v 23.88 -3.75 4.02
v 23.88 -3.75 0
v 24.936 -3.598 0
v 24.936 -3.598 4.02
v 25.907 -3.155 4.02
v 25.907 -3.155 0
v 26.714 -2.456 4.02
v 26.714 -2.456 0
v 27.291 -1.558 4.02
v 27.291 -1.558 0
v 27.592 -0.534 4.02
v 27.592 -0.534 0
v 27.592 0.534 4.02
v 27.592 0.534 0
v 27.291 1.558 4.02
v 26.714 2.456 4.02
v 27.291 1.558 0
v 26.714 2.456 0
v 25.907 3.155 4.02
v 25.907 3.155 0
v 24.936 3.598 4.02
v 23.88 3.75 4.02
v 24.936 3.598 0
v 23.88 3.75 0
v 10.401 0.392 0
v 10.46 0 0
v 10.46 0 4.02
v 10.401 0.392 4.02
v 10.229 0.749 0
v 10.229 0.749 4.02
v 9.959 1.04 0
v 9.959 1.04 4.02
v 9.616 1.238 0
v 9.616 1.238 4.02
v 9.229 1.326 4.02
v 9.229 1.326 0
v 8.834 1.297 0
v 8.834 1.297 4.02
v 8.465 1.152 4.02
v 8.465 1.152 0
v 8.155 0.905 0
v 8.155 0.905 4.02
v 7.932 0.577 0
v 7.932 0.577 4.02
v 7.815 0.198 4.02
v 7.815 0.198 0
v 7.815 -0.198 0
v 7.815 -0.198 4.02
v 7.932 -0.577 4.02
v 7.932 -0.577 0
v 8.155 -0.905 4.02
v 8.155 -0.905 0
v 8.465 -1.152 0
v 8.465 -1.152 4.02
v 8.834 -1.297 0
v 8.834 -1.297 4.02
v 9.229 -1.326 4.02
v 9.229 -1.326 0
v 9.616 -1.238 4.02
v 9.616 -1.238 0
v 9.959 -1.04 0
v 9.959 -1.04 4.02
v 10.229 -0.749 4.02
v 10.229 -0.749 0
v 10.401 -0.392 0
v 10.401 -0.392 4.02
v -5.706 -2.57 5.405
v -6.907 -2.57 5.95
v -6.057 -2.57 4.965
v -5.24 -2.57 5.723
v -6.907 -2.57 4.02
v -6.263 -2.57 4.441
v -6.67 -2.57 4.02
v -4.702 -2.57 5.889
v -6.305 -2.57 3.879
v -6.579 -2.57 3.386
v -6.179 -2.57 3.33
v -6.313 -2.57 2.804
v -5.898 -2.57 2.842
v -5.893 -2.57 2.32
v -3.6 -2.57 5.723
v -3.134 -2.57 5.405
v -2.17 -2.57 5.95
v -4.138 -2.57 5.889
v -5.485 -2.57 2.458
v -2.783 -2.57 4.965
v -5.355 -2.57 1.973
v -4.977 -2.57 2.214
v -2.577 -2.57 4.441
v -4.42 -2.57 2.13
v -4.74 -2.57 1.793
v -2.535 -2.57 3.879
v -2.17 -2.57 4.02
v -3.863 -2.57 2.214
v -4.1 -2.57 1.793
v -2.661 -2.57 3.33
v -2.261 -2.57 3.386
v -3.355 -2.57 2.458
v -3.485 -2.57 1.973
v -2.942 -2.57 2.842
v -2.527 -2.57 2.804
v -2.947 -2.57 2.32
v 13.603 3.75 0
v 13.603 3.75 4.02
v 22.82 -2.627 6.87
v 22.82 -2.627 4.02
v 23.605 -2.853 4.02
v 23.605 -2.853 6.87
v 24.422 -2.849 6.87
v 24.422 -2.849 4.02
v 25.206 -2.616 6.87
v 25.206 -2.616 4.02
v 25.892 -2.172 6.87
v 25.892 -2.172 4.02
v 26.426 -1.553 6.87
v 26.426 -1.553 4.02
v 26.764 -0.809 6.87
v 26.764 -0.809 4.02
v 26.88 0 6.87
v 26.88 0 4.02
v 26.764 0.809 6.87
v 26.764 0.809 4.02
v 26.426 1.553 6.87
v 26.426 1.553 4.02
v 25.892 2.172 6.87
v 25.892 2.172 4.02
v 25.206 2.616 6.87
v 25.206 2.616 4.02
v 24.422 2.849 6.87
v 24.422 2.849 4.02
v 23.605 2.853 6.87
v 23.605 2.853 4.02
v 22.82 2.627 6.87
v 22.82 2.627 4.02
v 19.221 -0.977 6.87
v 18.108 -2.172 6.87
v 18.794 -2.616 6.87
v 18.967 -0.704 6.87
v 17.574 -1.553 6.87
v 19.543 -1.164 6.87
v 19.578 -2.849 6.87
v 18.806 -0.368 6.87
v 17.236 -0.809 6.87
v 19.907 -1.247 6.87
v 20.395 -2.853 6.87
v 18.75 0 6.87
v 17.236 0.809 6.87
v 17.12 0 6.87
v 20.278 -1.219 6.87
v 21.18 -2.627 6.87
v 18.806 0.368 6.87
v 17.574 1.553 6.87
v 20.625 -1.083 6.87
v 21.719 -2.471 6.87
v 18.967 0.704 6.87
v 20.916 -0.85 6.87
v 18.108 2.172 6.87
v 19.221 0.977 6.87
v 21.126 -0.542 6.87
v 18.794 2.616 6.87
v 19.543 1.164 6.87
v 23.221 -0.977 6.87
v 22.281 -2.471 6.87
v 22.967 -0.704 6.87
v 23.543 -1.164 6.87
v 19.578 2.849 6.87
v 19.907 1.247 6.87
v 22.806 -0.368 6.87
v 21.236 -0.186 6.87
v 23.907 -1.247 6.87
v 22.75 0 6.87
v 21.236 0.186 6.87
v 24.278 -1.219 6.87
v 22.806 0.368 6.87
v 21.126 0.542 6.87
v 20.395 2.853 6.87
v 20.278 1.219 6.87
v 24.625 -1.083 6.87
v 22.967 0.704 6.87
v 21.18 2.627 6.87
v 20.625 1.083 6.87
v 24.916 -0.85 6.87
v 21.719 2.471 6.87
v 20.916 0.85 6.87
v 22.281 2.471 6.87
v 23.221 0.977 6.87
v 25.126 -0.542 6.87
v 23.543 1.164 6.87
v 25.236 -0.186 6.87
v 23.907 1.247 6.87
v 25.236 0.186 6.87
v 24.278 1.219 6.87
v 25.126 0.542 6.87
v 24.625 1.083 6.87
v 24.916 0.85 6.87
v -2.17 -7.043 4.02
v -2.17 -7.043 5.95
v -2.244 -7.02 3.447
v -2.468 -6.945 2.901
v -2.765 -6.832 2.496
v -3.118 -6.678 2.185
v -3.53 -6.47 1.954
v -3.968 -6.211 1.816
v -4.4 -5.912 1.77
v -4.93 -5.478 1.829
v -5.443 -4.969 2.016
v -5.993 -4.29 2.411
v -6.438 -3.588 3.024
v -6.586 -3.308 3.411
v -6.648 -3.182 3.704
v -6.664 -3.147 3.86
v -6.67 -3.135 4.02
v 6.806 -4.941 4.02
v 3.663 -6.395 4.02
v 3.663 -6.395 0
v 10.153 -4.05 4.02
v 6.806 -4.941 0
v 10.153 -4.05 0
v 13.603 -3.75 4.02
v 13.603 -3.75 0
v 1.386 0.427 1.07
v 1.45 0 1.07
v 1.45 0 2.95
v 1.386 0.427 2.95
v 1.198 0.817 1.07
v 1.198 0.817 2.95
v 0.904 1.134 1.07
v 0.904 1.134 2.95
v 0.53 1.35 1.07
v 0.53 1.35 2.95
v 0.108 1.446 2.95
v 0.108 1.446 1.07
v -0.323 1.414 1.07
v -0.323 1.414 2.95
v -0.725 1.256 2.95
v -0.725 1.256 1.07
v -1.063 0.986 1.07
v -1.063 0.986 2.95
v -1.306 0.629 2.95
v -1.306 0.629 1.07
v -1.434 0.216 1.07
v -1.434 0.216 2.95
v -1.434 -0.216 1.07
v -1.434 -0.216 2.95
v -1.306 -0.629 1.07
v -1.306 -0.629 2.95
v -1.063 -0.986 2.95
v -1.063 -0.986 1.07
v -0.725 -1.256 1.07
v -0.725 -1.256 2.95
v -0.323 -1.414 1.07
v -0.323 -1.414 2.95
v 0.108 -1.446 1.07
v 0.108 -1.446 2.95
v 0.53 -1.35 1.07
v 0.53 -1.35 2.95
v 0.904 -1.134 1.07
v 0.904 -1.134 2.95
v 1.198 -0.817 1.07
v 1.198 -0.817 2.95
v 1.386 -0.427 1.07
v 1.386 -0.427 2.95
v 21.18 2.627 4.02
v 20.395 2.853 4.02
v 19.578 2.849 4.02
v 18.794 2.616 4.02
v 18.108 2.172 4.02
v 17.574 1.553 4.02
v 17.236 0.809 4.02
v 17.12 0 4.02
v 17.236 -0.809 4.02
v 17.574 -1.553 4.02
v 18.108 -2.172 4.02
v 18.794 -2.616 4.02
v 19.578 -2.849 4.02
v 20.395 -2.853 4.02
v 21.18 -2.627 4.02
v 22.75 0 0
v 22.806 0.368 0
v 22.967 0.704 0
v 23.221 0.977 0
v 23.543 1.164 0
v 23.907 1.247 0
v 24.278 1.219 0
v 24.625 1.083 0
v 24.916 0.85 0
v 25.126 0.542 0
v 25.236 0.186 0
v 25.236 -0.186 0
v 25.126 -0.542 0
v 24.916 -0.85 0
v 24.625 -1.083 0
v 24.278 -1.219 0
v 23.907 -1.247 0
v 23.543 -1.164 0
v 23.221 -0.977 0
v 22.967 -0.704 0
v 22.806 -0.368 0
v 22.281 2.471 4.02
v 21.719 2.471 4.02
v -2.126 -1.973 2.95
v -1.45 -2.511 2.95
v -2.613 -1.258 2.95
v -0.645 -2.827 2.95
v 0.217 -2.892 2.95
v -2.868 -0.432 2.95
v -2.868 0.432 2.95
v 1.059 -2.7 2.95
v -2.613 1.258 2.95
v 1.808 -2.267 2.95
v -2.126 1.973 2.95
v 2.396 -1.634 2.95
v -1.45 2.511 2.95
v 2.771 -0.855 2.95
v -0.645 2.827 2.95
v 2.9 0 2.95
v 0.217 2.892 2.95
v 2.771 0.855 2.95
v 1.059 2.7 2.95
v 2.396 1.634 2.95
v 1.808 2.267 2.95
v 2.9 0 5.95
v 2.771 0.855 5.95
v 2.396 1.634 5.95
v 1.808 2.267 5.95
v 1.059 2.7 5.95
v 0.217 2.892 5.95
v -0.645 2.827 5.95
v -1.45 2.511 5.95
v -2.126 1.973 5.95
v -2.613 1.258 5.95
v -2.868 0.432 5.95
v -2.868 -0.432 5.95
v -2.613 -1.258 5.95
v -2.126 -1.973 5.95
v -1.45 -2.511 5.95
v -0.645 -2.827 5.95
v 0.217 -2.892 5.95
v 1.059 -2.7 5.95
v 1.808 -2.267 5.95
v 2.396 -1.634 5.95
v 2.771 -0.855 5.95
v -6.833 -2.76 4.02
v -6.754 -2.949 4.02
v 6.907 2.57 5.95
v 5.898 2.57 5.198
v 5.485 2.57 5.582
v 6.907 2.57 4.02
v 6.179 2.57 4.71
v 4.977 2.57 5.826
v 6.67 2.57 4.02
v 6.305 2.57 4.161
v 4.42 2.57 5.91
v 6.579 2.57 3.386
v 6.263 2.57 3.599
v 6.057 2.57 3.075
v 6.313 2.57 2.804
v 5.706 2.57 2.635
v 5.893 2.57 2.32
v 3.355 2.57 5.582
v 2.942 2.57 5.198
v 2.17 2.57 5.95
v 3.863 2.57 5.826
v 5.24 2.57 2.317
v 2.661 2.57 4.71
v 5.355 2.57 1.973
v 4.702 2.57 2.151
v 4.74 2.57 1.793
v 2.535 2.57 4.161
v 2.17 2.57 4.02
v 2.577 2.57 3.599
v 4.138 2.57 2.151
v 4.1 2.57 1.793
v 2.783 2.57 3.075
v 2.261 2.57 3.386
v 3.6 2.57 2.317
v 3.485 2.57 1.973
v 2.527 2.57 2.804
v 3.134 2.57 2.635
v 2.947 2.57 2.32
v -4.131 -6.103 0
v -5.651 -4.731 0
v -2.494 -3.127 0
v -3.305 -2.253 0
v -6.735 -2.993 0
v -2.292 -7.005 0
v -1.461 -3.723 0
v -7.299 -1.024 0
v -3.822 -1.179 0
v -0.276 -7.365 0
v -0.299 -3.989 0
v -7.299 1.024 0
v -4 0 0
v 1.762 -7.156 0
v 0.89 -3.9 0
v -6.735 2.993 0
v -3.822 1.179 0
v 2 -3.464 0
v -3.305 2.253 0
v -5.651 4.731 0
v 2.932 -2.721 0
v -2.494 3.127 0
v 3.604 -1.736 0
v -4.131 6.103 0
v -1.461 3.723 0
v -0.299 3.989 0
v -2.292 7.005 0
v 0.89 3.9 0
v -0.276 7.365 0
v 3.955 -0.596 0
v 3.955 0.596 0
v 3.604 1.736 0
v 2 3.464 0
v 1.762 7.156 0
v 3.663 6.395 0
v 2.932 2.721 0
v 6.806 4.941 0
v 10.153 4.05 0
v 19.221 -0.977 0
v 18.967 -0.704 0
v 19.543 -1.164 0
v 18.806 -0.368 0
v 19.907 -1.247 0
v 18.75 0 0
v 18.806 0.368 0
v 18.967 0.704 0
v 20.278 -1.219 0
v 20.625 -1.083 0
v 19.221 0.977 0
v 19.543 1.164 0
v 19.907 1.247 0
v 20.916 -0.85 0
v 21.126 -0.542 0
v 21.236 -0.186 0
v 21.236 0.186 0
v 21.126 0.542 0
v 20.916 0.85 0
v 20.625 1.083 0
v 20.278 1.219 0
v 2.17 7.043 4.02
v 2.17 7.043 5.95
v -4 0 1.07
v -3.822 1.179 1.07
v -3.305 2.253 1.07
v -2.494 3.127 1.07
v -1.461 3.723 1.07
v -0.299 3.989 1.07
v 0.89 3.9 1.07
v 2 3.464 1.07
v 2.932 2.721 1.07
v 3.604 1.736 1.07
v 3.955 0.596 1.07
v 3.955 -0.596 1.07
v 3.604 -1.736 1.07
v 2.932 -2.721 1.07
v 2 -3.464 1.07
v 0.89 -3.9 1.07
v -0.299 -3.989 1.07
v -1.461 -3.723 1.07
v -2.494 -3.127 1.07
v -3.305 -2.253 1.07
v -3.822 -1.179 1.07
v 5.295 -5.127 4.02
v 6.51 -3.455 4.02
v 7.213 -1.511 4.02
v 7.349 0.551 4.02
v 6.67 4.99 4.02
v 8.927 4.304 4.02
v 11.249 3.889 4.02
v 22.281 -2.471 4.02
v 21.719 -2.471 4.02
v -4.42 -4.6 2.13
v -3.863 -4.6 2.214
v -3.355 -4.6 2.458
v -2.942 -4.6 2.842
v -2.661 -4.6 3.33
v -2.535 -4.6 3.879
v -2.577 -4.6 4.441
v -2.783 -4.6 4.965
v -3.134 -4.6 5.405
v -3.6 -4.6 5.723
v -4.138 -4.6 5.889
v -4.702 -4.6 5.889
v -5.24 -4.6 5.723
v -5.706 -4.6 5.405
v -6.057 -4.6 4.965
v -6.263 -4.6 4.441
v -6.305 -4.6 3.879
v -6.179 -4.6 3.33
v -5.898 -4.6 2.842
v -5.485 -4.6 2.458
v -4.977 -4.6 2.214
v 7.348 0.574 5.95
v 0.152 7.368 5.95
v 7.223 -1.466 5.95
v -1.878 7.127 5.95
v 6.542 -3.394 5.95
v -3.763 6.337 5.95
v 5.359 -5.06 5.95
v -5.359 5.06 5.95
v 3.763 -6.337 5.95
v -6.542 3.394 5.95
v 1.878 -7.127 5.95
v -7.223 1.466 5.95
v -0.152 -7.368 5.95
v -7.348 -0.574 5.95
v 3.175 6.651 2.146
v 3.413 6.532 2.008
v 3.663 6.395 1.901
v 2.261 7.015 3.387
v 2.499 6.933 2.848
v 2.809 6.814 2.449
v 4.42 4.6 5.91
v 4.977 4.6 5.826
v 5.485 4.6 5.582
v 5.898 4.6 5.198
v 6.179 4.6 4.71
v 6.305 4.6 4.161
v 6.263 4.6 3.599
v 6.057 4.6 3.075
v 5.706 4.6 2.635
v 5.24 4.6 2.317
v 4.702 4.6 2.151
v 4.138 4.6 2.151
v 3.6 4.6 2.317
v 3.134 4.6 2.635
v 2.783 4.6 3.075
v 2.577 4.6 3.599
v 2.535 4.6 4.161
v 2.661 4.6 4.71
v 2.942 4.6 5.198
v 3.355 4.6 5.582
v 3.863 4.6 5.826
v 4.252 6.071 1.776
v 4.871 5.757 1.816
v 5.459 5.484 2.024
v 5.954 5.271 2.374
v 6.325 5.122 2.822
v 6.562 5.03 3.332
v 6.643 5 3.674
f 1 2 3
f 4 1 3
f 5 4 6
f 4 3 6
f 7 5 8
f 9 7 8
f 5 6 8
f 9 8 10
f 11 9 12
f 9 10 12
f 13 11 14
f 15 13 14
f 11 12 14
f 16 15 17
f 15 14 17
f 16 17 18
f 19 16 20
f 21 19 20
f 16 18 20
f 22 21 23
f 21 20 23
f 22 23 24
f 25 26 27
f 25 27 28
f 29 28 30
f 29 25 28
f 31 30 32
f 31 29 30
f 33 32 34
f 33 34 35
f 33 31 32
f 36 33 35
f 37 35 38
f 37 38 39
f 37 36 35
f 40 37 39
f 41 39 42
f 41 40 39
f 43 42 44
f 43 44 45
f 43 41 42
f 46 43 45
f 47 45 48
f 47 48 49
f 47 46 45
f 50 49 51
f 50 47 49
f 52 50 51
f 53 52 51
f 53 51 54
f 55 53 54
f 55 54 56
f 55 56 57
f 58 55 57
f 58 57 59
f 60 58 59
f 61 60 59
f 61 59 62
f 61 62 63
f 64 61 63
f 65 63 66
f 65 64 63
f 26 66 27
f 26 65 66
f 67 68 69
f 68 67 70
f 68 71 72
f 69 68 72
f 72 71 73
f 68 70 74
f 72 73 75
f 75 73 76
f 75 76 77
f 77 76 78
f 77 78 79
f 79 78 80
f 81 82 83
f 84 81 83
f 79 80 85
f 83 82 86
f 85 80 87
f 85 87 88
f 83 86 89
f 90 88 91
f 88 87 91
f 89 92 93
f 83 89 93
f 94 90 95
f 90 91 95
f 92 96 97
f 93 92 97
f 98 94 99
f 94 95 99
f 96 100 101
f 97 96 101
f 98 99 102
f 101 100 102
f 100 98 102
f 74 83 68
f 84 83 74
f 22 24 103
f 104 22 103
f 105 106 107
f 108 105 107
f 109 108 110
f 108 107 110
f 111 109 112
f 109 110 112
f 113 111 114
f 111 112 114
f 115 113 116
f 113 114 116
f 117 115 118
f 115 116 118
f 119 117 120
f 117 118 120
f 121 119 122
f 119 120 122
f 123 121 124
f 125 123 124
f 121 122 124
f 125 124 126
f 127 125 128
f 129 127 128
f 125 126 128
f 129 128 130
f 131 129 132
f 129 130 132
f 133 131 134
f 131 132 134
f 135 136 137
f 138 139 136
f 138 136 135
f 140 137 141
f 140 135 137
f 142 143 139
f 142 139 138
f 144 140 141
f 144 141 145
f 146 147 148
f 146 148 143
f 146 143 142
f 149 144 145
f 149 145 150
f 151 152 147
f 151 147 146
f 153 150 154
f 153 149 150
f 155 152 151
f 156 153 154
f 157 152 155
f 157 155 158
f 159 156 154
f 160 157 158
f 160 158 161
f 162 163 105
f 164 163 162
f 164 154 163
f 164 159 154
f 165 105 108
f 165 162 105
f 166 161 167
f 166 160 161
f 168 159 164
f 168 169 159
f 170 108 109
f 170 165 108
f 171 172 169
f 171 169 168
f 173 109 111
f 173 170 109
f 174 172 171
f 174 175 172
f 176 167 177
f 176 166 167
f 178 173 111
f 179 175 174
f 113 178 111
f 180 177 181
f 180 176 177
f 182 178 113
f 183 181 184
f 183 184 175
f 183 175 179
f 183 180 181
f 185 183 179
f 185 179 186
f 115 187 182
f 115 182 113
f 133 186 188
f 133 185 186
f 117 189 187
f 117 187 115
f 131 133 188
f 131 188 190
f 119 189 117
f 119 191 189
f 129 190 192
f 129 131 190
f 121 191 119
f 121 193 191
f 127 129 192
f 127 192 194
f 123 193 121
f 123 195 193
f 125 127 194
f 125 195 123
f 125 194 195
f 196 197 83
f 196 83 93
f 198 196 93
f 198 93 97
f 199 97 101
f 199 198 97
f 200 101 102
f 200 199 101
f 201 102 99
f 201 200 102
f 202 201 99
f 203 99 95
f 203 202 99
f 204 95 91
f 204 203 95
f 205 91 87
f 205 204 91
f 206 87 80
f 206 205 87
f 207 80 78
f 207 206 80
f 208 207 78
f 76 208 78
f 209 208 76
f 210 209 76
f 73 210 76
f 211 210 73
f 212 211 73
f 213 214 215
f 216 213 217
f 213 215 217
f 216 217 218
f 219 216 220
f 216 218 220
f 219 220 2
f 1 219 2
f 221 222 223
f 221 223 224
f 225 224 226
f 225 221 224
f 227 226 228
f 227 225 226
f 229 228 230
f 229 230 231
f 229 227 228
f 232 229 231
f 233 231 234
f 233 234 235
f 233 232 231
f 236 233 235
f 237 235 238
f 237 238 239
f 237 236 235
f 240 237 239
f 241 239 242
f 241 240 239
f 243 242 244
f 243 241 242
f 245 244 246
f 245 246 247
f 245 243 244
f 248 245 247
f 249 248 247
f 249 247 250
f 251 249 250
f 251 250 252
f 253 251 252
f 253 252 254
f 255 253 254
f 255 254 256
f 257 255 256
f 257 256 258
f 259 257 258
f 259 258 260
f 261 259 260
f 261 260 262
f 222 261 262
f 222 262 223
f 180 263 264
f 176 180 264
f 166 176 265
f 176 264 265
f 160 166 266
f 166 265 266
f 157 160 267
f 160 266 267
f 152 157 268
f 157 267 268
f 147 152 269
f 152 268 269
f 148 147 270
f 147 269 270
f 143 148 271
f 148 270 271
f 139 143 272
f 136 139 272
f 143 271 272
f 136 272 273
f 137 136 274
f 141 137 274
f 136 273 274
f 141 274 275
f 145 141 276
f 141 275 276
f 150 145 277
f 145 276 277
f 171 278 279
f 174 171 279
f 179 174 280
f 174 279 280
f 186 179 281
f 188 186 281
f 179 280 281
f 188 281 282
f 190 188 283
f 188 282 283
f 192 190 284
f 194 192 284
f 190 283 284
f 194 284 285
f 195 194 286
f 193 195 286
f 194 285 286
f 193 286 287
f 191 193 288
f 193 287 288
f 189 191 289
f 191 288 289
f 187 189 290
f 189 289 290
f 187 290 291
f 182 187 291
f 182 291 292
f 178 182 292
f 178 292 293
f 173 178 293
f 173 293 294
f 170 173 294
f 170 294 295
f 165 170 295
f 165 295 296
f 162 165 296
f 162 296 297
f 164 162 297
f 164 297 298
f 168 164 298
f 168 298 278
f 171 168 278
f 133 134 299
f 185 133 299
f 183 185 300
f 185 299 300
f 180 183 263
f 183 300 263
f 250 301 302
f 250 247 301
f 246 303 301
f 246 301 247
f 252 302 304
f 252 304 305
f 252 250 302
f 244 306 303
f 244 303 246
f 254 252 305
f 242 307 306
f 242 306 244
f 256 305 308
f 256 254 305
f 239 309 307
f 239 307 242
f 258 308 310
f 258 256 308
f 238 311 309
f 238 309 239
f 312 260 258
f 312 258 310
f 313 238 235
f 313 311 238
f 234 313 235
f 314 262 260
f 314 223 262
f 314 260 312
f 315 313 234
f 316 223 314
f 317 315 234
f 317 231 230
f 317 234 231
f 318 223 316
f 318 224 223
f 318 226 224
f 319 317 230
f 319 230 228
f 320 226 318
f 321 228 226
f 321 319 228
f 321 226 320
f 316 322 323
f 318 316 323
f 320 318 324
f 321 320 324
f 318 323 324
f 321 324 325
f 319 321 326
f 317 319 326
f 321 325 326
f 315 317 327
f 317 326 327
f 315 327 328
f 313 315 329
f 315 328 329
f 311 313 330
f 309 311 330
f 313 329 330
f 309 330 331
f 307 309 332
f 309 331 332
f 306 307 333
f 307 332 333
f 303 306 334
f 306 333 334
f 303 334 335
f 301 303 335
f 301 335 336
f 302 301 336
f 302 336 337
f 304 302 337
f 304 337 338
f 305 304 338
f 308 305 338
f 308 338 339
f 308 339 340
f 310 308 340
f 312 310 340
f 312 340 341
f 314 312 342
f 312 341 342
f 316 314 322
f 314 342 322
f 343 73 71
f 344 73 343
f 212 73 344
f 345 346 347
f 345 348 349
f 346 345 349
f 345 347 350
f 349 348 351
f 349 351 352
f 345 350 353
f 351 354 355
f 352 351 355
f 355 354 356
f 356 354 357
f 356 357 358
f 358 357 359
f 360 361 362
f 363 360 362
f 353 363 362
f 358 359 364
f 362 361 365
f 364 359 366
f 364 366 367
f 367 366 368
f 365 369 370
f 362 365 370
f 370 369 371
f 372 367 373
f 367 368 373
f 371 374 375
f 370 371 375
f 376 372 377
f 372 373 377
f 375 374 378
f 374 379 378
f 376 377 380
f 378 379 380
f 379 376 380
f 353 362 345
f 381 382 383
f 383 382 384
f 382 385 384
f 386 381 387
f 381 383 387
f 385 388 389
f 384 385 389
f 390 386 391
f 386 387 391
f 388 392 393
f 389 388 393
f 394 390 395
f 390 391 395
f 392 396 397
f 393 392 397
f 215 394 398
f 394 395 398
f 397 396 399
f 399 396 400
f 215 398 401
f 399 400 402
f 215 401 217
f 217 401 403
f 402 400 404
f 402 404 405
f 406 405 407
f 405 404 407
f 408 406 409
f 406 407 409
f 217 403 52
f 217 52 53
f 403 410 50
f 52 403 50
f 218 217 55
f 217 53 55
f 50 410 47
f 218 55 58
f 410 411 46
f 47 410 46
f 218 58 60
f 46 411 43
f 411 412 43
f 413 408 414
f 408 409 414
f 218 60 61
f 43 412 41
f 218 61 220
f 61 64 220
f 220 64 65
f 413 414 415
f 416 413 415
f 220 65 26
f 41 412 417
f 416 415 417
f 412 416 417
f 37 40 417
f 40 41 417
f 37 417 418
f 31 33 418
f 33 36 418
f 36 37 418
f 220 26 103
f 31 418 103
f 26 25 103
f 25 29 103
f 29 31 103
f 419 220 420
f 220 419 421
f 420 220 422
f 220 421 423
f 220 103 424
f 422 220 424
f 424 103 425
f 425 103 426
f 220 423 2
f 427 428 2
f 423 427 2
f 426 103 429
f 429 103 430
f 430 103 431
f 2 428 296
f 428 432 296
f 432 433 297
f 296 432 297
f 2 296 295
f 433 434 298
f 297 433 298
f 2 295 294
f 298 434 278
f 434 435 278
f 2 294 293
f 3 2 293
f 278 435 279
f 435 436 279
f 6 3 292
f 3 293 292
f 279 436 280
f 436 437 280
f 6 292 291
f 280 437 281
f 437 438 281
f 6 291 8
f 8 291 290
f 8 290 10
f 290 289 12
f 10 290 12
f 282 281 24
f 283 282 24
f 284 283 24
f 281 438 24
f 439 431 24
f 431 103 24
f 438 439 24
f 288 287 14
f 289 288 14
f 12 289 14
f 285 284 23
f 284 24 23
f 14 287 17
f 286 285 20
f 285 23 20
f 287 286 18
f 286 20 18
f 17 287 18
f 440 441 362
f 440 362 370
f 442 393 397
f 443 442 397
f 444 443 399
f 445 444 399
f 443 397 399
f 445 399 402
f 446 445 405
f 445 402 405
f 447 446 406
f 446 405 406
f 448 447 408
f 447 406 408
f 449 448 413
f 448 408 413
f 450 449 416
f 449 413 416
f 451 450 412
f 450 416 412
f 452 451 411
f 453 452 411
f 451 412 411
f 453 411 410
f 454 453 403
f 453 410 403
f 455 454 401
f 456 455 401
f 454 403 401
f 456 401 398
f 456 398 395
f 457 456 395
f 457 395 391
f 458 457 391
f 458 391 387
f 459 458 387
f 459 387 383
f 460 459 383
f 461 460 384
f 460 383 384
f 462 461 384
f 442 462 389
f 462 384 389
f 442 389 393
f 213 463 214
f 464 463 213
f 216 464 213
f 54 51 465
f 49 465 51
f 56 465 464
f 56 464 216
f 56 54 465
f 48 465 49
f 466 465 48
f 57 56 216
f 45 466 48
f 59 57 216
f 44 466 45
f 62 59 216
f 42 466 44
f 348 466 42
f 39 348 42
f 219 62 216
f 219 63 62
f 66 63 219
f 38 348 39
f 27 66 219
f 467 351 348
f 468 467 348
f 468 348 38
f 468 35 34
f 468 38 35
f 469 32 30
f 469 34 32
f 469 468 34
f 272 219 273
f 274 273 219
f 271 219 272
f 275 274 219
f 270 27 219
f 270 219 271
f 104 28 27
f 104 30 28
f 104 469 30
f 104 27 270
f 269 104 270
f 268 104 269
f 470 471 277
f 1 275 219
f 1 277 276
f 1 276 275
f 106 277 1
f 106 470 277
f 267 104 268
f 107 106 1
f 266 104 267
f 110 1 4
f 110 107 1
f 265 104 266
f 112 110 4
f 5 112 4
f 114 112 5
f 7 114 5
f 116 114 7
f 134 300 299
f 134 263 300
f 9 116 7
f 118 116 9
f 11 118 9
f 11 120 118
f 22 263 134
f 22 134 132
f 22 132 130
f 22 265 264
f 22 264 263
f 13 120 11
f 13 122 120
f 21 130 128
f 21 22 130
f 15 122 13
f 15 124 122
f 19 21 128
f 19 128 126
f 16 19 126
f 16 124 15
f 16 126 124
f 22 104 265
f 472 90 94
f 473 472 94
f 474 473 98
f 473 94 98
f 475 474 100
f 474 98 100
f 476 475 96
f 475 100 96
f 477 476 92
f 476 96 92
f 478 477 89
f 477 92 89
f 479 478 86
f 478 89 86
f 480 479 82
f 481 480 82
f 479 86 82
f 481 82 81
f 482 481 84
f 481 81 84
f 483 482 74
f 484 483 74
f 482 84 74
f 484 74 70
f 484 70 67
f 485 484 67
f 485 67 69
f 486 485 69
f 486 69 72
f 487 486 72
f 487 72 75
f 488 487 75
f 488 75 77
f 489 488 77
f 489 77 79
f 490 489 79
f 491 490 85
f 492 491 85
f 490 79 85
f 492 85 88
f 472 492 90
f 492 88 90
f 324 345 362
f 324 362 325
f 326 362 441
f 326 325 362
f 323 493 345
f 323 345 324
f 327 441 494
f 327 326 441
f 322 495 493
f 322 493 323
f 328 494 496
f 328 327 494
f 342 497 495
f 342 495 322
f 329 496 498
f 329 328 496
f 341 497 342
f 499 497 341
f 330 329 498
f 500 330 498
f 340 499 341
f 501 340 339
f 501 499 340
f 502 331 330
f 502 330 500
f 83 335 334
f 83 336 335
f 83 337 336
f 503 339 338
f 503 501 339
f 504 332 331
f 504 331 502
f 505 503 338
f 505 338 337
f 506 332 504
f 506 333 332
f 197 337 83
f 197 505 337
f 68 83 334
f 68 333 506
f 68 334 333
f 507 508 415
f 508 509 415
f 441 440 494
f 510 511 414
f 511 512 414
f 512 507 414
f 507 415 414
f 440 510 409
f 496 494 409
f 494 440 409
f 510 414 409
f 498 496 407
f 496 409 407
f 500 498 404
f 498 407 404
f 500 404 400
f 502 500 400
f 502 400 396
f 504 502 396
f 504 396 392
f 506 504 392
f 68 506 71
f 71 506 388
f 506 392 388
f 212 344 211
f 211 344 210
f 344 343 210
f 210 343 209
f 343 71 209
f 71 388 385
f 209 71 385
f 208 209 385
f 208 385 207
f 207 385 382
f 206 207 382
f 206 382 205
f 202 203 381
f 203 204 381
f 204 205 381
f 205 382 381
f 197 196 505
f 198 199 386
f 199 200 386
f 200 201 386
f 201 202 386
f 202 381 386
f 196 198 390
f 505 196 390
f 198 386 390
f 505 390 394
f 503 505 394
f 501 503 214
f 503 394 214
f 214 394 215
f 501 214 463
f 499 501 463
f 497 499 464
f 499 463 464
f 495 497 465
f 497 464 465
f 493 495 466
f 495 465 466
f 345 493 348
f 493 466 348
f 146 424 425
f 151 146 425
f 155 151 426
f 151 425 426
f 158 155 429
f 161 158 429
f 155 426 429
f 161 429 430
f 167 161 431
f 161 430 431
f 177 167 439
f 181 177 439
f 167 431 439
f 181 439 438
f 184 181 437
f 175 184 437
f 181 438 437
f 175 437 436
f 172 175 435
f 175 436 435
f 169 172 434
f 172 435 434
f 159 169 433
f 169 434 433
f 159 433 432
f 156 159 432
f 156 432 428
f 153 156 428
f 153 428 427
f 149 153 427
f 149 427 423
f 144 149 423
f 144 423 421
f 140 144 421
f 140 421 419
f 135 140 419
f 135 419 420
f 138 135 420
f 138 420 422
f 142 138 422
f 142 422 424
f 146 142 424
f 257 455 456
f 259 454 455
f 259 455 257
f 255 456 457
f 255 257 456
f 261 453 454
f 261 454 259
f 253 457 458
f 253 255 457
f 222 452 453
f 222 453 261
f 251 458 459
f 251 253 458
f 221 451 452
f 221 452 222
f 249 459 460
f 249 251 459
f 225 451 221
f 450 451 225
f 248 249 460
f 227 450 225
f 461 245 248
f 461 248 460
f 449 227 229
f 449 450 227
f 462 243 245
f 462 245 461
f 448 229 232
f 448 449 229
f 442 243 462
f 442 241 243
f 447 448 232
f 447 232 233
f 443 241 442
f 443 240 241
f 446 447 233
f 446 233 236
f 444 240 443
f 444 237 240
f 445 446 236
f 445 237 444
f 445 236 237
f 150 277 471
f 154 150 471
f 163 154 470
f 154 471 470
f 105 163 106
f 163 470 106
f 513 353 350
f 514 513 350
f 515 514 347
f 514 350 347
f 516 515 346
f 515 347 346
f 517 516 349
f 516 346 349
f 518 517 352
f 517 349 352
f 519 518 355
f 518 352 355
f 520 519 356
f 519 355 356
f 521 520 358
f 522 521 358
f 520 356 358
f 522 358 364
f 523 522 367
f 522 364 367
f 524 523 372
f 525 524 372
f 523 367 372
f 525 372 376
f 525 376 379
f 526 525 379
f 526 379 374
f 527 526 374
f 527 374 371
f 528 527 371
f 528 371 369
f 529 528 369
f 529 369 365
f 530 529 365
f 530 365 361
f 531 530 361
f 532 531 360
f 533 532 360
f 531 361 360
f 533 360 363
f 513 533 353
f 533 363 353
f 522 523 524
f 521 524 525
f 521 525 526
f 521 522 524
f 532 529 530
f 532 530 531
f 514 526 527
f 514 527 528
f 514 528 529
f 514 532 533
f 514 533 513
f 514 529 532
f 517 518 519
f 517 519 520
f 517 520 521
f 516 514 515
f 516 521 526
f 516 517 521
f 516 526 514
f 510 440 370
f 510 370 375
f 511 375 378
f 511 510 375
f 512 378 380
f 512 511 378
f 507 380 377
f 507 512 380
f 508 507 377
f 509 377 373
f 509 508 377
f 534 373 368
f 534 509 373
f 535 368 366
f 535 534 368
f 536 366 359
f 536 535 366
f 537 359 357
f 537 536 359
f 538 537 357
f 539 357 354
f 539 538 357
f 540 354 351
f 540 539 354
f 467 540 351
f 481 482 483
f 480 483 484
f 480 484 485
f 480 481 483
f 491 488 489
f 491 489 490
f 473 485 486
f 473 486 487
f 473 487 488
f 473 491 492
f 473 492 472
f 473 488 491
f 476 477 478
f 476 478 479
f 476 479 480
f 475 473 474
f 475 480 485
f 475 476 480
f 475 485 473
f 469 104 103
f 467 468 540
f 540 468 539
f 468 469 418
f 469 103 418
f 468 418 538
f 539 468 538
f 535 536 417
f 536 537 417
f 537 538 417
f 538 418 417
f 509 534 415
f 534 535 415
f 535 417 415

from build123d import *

# Parameters (mm, degrees)
SCHIZZO1_R                   = 1.45
SCHIZZO1_R_2                 = 1.33
ESTRUSIONE_ESTRUSIONE1_DEPTH = 4.02
ESTRUSIONE_ESTRUSIONE2_START = -4.02
SCHIZZO2_R                   = 7.37
SCHIZZO2_R_2                 = 1.45
ESTRUSIONE_ESTRUSIONE2_DEPTH = 5.95
ESTRUSIONE_ESTRUSIONE3_START = -4.02
ESTRUSIONE_ESTRUSIONE3_DEPTH = 6.87
FORO_FILETTATO_M3X0_5_1_D    = 2.5
SCHIZZO6_R                   = 4
TAGLIO_ESTRUSIONE1_DEPTH     = 1.07
SCHIZZO8_R                   = 2.9
TAGLIO_ESTRUSIONE2_DEPTH     = 3
SCHIZZO9_W                   = 0.7
SCHIZZO9_H                   = 1.93
TAGLIO_ESTRUSIONE3_DEPTH     = 4.8
SCHIZZO11_W                  = 0.7
SCHIZZO11_H                  = 1.93
TAGLIO_ESTRUSIONE4_DEPTH     = 4.8
SCHIZZO12_R                  = 1.89
ESTRUSIONE_ESTRUSIONE4_DEPTH = 2.03
SCHIZZO13_R                  = 1.89
ESTRUSIONE_ESTRUSIONE5_DEPTH = 2.03


with BuildPart() as part:
    # Schizzo1 → Estrusione-Estrusione1 (new body)
    with BuildSketch(Plane.XY):
        with BuildLine():
            Line((13.603470146, -3.75), (23.88, -3.75))
            ThreePointArc((23.88, -3.75), (27.63, 0), (23.88, 3.75))
            Line((23.88, 3.75), (13.603470146, 3.75))
            ThreePointArc((13.603470146, 3.75), (8.460288245, 4.422618389), (3.663046217, 6.395232006))
            ThreePointArc((3.663046217, 6.395232006), (-7.37, 0), (3.663046217, -6.395232006))
            ThreePointArc((3.663046217, -6.395232006), (8.460288245, -4.422618389), (13.603470146, -3.75))
        make_face()
        Circle(SCHIZZO1_R, mode=Mode.SUBTRACT)
        with Locations((9.13, 0)):
            Circle(SCHIZZO1_R_2, mode=Mode.SUBTRACT)
    extrude(amount=ESTRUSIONE_ESTRUSIONE1_DEPTH)

    # Schizzo2 → Estrusione-Estrusione2 (add)
    with BuildSketch(Plane.XY.offset(4.02).offset(ESTRUSIONE_ESTRUSIONE2_START)):
        with Locations(Location((0, 0, 0), (0, 0, 180))):
            Circle(SCHIZZO2_R)
        with Locations(Location((0, 0, 0), (0, 0, 180))):
            Circle(SCHIZZO2_R_2, mode=Mode.SUBTRACT)
    extrude(amount=ESTRUSIONE_ESTRUSIONE2_DEPTH)

    # Schizzo3 → Estrusione-Estrusione3 (add)
    with BuildSketch(Plane.XY.offset(4.02).offset(ESTRUSIONE_ESTRUSIONE3_START)):
        with BuildLine():
            ThreePointArc((22.819672131, -2.627018485), (26.88, 0), (22.819672131, 2.627018485))
            ThreePointArc((22.819672131, 2.627018485), (22, 2.451336878), (21.180327869, 2.627018485))
            ThreePointArc((21.180327869, 2.627018485), (17.12, 0), (21.180327869, -2.627018485))
            ThreePointArc((21.180327869, -2.627018485), (22, -2.451336878), (22.819672131, -2.627018485))
        make_face()
    extrude(amount=ESTRUSIONE_ESTRUSIONE3_DEPTH)

    # Foro filettato M3x0.5-1 (through all)
    with Locations(Plane.XY.offset(6.87)):
        with Locations((24, 0), (20, 0)):
            Hole(FORO_FILETTATO_M3X0_5_1_D / 2)

    # Schizzo6 → Taglio-Estrusione1 (cut)
    with BuildSketch(Plane(origin=(0, 0, 0), x_dir=(-1, 0, 0), z_dir=(0, 0, -1))):
        Circle(SCHIZZO6_R)
    extrude(amount=-TAGLIO_ESTRUSIONE1_DEPTH, mode=Mode.SUBTRACT)

    # Schizzo8 → Taglio-Estrusione2 (cut)
    with BuildSketch(Plane.XY.offset(5.95)):
        Circle(SCHIZZO8_R)
    extrude(amount=-TAGLIO_ESTRUSIONE2_DEPTH, mode=Mode.SUBTRACT)

    # Schizzo9 → Taglio-Estrusione3 (cut)
    with BuildSketch(Plane(origin=(0, 7.37, 0), x_dir=(1, 0, 0), z_dir=(0, 1, 0))):
        with BuildLine():
            ThreePointArc((2.17, -4.02), (4.42, -1.77), (6.67, -4.02))
            Line((6.67, -4.02), (6.67, -5.95))
            Line((6.67, -5.95), (2.17, -5.95))
            Line((2.17, -5.95), (2.17, -4.02))
        make_face()
        with Locations((7.02, -4.985)):
            Rectangle(SCHIZZO9_W, SCHIZZO9_H)
    extrude(amount=-TAGLIO_ESTRUSIONE3_DEPTH, mode=Mode.SUBTRACT)

    # Schizzo11 → Taglio-Estrusione4 (cut)
    with BuildSketch(Plane(origin=(0, -7.37, 0), x_dir=(-1, 0, 0), z_dir=(0, -1, 0))):
        with BuildLine():
            ThreePointArc((2.17, -4.02), (4.42, -1.77), (6.67, -4.02))
            Line((6.67, -4.02), (6.67, -5.95))
            Line((6.67, -5.95), (2.17, -5.95))
            Line((2.17, -5.95), (2.17, -4.02))
        make_face()
        with Locations((7.02, -4.985)):
            Rectangle(SCHIZZO11_W, SCHIZZO11_H)
    extrude(amount=-TAGLIO_ESTRUSIONE4_DEPTH, mode=Mode.SUBTRACT)

    # Schizzo12 → Estrusione-Estrusione4 (add)
    with BuildSketch(Plane(origin=(0, 2.57, 0), x_dir=(1, 0, 0), z_dir=(0, 1, 0))):
        with Locations(Location((4.42, -4.02, 0), (0, 0, 270))):
            Circle(SCHIZZO12_R)
    extrude(amount=ESTRUSIONE_ESTRUSIONE4_DEPTH)

    # Schizzo13 → Estrusione-Estrusione5 (add)
    with BuildSketch(Plane(origin=(0, -2.57, 0), x_dir=(-1, 0, 0), z_dir=(0, -1, 0))):
        with Locations(Location((4.42, -4.02, 0), (0, 0, 90))):
            Circle(SCHIZZO13_R)
    extrude(amount=ESTRUSIONE_ESTRUSIONE5_DEPTH)


solid = part.part
